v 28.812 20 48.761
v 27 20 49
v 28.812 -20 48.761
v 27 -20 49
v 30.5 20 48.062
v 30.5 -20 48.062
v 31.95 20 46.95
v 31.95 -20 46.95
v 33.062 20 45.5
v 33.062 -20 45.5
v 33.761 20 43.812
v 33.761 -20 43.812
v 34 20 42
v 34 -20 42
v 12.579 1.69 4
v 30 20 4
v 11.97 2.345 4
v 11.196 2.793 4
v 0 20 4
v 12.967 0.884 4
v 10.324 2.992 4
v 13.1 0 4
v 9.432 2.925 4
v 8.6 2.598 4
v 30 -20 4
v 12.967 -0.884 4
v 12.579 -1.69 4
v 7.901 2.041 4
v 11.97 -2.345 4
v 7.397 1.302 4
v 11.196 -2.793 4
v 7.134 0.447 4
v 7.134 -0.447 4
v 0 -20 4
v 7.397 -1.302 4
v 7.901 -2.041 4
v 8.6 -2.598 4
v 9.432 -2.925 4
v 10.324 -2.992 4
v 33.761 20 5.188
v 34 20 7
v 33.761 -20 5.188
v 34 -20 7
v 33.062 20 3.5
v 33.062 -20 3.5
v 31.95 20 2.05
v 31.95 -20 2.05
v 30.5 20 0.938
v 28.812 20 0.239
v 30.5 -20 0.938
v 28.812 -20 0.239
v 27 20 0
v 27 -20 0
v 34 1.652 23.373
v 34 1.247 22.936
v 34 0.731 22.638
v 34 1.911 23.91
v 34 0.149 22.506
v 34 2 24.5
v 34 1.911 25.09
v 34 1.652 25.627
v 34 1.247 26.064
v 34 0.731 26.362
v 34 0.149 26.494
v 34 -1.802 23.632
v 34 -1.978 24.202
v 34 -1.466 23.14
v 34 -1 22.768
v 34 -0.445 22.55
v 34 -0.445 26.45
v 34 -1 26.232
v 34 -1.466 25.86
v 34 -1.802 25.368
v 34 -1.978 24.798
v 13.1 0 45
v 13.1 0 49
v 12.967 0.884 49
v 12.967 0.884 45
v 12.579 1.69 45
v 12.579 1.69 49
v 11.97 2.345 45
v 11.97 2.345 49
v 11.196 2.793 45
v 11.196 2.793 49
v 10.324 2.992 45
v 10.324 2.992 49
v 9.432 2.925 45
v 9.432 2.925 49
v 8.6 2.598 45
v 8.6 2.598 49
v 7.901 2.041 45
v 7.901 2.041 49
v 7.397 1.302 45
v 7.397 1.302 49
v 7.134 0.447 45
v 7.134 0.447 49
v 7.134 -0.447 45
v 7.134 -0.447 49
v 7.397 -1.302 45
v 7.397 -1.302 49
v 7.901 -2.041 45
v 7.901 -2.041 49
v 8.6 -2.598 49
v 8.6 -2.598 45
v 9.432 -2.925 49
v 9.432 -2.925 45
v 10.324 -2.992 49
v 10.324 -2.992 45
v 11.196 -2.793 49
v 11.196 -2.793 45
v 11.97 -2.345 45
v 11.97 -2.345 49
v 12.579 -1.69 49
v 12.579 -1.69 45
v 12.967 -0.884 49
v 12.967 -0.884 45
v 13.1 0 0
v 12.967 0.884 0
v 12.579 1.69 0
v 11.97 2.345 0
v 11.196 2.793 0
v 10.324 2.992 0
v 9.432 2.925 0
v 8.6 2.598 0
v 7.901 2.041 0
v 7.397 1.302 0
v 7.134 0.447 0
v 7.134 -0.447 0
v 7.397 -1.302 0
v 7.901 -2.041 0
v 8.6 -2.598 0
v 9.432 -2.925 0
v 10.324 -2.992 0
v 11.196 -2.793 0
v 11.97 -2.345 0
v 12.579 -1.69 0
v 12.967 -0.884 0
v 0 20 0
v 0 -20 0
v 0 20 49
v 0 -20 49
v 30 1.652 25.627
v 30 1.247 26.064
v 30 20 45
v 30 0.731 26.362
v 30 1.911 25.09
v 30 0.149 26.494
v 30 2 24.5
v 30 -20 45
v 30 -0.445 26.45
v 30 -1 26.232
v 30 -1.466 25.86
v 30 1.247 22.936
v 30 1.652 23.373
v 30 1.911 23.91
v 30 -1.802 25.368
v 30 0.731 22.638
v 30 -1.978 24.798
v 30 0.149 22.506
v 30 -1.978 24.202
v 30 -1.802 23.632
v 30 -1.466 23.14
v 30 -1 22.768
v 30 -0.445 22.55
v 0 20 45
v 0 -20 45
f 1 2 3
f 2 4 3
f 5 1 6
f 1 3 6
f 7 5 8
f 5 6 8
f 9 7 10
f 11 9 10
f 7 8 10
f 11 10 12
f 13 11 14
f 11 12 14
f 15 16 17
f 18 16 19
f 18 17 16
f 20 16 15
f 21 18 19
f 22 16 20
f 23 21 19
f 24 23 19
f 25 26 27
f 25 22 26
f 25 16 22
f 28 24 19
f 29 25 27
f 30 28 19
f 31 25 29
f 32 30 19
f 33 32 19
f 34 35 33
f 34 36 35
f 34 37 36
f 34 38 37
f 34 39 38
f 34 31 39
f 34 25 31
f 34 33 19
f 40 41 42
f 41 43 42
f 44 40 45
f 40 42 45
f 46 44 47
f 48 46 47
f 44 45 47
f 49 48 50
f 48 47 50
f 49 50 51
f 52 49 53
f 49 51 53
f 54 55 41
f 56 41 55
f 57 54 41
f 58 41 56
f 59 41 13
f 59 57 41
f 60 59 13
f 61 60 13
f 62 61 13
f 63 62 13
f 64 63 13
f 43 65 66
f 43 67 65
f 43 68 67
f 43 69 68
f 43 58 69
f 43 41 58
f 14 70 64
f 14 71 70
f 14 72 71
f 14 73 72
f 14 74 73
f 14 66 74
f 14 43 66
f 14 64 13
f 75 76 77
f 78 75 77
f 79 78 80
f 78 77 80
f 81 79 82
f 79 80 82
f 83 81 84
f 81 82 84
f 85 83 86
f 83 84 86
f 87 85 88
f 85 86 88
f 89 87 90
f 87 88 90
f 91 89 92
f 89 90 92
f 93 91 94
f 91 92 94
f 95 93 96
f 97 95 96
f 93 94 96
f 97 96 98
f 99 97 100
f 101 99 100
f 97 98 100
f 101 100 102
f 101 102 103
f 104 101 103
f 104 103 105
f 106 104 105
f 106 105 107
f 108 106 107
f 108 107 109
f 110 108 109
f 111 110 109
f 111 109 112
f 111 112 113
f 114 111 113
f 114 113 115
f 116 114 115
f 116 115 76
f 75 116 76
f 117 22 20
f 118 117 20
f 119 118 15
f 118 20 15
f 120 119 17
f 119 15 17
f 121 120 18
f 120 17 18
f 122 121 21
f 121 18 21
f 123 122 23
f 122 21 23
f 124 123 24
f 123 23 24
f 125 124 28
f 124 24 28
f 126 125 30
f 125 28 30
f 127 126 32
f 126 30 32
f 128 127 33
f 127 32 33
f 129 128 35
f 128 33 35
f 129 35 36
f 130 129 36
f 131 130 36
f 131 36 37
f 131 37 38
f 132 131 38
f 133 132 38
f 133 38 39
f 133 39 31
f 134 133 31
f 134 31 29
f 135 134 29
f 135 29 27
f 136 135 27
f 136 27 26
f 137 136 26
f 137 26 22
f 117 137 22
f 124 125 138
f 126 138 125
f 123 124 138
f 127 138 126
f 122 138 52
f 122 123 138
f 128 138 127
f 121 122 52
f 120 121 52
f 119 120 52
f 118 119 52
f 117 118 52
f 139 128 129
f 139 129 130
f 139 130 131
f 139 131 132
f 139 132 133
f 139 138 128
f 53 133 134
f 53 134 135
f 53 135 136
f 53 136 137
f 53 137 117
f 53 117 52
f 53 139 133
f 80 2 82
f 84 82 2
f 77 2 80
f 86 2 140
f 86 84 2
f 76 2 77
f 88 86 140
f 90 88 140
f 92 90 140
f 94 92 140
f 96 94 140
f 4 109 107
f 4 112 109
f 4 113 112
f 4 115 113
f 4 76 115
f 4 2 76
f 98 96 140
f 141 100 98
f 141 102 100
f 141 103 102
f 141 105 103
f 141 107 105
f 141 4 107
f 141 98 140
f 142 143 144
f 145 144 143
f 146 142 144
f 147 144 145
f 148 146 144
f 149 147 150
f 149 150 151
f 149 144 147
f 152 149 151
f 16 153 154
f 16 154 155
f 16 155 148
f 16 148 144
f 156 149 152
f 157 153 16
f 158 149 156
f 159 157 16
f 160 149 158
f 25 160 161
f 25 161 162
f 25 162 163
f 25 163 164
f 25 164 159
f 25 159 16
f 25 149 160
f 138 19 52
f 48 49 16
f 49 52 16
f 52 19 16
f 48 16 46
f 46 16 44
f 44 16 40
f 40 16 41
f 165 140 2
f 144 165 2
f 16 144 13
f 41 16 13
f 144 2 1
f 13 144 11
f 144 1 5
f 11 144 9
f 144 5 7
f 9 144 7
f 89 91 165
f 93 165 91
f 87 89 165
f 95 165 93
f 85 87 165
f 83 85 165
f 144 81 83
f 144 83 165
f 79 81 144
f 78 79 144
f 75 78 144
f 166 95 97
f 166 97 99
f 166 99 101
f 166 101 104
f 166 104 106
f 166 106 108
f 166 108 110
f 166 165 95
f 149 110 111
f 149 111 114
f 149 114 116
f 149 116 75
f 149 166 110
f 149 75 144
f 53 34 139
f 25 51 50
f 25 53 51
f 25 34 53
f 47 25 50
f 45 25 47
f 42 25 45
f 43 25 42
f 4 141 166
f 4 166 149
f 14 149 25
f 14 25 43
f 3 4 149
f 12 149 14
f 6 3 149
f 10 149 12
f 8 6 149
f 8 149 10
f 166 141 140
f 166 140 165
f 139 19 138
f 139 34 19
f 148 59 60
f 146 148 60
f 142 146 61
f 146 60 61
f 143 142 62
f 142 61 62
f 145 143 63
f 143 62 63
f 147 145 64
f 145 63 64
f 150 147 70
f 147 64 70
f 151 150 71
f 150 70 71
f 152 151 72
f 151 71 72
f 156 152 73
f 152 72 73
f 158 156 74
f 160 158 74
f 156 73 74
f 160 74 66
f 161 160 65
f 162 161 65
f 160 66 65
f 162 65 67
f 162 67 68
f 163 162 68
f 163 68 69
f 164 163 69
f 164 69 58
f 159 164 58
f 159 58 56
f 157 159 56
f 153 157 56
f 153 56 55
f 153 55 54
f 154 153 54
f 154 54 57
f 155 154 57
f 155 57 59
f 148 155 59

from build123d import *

# Parameters (mm, degrees)
F1_DEPTH      = 20
F1_DEPTH_BACK = 20
F2_R          = 7
F3_R          = 2
F4_DEPTH      = 25
F5_R          = 3
F6_DEPTH      = 53


with BuildPart() as f1:
    # F0 (on Front) → F1 (new body, two sides)
    with BuildSketch(Plane.XZ) as f1_sk:
        Polygon((0, 4), (0, 0), (34, 0), (34, 49), (0, 49), (0, 45), (30, 45), (30, 4), align=None)
    extrude(amount=F1_DEPTH)
    extrude(f1_sk.sketch, amount=-F1_DEPTH_BACK)

    # F2
    f2_edges = [f1.edges().sort_by_distance(p)[0] for p in [
        (34, 0, 49),
        (34, 0, 0),
    ]]
    fillet(f2_edges, radius=F2_R)

    # F3 (on face) → F4 (cut)
    with BuildSketch(Plane.YZ.offset(34)):
        with Locations((0, 24.5)):
            Circle(F3_R)
    extrude(amount=-F4_DEPTH, mode=Mode.SUBTRACT)

    # F5 (on face) → F6 (cut)
    with BuildSketch(Plane.XY.offset(49)):
        with Locations((10.1, 0)):
            Circle(F5_R)
    extrude(amount=-F6_DEPTH, mode=Mode.SUBTRACT)


solid = f1.part
